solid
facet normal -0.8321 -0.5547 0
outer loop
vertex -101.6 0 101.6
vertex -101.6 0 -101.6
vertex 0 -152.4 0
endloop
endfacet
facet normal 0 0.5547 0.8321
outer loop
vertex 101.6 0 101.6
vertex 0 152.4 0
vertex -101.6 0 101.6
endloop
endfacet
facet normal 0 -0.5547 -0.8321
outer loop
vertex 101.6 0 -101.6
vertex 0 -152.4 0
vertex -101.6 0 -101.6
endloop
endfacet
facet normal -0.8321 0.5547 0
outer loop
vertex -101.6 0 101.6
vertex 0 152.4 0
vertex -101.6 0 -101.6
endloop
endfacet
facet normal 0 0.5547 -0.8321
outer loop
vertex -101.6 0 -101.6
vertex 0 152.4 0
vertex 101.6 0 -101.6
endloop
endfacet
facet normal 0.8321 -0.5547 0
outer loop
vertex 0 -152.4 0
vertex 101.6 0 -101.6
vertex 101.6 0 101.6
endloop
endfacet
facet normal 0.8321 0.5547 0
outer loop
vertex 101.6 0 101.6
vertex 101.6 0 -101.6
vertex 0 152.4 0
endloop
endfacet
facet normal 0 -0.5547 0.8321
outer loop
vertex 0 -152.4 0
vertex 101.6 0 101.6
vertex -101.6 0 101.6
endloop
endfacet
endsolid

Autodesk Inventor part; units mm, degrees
ref_plane "YZ Plane" through (0, 0, 0) normal (1, 0, 0) x (0, 1, 0)
ref_plane "XZ Plane" through (0, 0, 0) normal (0, 1, 0) x (-1, 0, 0)
ref_plane "XY Plane" through (0, 0, 0) normal (0, 0, 1) x (1, 0, 0)
sketch "Sketch1" plane through (0, 0, 0) normal (0, 1, 0) x (-1, 0, 0)
  line L0 (-101.6, -101.6) -> (101.6, -101.6)
  line L1 (101.6, -101.6) -> (101.6, 101.6)
  line L2 (101.6, 101.6) -> (-101.6, 101.6)
  line L3 (-101.6, 101.6) -> (-101.6, -101.6)
  line L4 (-101.6, -101.6) -> (101.6, 101.6) construction
  line L5 (101.6, -101.6) -> (-101.6, 101.6) construction
  point P0 (0, 0)
  dimension "d0" = 203.2
  dimension "d1" = 203.2
extrude "Extrusion1" add sketch "Sketch1" along normal mid plane 304.8
sketch "Sketch2" plane through (101.6, -152.4, -101.6) normal (1, 0, 0) x (0, 0, -1)
  line L0 (0, 304.8) -> (-203.2, 304.8) projected
  line L1 (-101.6, 304.8) -> (-203.2, 152.4)
  line L2 (-203.2, 0) -> (-203.2, 304.8) projected
  line L3 (-203.2, 152.4) -> (-101.6, 0)
  line L4 (0, 0) -> (-203.2, 0) projected
  line L5 (-101.6, 0) -> (0, 152.4)
  line L6 (0, 0) -> (0, 304.8) projected
  line L7 (-101.6, 304.8) -> (0, 152.4)
  point P0 (-101.6, 152.4)
extrude "Extrusion2" cut sketch "Sketch2" against normal blind 304.8 contours L6 L7 L0 | L1 L2 L0 | L6 L4 L5 | L3 L4 L2
sketch "Sketch3" plane through (0, 0, 0) normal (0, 0, 1) x (1, 0, 0)
  line L0 (-101.6, 152.4) -> (101.6, 152.4) projected
  line L1 (0, 152.4) -> (-101.6, 0)
  line L2 (-101.6, 0) -> (0, -152.4)
  line L3 (-101.6, -152.4) -> (101.6, -152.4) projected
  line L4 (101.6, 0) -> (101.6, -152.4) projected
  line L5 (101.6, 0) -> (0, 152.4)
  line L6 (101.6, 0) -> (0, -152.4)
  line L7 (-101.6, 0) -> (-101.6, 152.4) projected
  line L8 (-101.6, 0) -> (101.6, 0) projected
  line L9 (101.6, 152.4) -> (101.6, 0) projected
  line L10 (-101.6, 152.4) -> (101.6, 152.4) projected
  line L11 (-101.6, -152.4) -> (-101.6, 0) projected
  line L12 (-101.6, -152.4) -> (101.6, -152.4) projected
  line L13 (101.6, 0) -> (101.6, -152.4) projected
  line L14 (-101.6, 0) -> (101.6, 0) projected
  point P0 (0, 0)
extrude "Extrusion3" cut sketch "Sketch3" along normal through all both and the other way through all contours L0 L1 L7 | L0 L9 L5 | L2 L3 L11 | L4 L3 L6
properties part number "Dice, Simplified" material "PVC-Piping"
